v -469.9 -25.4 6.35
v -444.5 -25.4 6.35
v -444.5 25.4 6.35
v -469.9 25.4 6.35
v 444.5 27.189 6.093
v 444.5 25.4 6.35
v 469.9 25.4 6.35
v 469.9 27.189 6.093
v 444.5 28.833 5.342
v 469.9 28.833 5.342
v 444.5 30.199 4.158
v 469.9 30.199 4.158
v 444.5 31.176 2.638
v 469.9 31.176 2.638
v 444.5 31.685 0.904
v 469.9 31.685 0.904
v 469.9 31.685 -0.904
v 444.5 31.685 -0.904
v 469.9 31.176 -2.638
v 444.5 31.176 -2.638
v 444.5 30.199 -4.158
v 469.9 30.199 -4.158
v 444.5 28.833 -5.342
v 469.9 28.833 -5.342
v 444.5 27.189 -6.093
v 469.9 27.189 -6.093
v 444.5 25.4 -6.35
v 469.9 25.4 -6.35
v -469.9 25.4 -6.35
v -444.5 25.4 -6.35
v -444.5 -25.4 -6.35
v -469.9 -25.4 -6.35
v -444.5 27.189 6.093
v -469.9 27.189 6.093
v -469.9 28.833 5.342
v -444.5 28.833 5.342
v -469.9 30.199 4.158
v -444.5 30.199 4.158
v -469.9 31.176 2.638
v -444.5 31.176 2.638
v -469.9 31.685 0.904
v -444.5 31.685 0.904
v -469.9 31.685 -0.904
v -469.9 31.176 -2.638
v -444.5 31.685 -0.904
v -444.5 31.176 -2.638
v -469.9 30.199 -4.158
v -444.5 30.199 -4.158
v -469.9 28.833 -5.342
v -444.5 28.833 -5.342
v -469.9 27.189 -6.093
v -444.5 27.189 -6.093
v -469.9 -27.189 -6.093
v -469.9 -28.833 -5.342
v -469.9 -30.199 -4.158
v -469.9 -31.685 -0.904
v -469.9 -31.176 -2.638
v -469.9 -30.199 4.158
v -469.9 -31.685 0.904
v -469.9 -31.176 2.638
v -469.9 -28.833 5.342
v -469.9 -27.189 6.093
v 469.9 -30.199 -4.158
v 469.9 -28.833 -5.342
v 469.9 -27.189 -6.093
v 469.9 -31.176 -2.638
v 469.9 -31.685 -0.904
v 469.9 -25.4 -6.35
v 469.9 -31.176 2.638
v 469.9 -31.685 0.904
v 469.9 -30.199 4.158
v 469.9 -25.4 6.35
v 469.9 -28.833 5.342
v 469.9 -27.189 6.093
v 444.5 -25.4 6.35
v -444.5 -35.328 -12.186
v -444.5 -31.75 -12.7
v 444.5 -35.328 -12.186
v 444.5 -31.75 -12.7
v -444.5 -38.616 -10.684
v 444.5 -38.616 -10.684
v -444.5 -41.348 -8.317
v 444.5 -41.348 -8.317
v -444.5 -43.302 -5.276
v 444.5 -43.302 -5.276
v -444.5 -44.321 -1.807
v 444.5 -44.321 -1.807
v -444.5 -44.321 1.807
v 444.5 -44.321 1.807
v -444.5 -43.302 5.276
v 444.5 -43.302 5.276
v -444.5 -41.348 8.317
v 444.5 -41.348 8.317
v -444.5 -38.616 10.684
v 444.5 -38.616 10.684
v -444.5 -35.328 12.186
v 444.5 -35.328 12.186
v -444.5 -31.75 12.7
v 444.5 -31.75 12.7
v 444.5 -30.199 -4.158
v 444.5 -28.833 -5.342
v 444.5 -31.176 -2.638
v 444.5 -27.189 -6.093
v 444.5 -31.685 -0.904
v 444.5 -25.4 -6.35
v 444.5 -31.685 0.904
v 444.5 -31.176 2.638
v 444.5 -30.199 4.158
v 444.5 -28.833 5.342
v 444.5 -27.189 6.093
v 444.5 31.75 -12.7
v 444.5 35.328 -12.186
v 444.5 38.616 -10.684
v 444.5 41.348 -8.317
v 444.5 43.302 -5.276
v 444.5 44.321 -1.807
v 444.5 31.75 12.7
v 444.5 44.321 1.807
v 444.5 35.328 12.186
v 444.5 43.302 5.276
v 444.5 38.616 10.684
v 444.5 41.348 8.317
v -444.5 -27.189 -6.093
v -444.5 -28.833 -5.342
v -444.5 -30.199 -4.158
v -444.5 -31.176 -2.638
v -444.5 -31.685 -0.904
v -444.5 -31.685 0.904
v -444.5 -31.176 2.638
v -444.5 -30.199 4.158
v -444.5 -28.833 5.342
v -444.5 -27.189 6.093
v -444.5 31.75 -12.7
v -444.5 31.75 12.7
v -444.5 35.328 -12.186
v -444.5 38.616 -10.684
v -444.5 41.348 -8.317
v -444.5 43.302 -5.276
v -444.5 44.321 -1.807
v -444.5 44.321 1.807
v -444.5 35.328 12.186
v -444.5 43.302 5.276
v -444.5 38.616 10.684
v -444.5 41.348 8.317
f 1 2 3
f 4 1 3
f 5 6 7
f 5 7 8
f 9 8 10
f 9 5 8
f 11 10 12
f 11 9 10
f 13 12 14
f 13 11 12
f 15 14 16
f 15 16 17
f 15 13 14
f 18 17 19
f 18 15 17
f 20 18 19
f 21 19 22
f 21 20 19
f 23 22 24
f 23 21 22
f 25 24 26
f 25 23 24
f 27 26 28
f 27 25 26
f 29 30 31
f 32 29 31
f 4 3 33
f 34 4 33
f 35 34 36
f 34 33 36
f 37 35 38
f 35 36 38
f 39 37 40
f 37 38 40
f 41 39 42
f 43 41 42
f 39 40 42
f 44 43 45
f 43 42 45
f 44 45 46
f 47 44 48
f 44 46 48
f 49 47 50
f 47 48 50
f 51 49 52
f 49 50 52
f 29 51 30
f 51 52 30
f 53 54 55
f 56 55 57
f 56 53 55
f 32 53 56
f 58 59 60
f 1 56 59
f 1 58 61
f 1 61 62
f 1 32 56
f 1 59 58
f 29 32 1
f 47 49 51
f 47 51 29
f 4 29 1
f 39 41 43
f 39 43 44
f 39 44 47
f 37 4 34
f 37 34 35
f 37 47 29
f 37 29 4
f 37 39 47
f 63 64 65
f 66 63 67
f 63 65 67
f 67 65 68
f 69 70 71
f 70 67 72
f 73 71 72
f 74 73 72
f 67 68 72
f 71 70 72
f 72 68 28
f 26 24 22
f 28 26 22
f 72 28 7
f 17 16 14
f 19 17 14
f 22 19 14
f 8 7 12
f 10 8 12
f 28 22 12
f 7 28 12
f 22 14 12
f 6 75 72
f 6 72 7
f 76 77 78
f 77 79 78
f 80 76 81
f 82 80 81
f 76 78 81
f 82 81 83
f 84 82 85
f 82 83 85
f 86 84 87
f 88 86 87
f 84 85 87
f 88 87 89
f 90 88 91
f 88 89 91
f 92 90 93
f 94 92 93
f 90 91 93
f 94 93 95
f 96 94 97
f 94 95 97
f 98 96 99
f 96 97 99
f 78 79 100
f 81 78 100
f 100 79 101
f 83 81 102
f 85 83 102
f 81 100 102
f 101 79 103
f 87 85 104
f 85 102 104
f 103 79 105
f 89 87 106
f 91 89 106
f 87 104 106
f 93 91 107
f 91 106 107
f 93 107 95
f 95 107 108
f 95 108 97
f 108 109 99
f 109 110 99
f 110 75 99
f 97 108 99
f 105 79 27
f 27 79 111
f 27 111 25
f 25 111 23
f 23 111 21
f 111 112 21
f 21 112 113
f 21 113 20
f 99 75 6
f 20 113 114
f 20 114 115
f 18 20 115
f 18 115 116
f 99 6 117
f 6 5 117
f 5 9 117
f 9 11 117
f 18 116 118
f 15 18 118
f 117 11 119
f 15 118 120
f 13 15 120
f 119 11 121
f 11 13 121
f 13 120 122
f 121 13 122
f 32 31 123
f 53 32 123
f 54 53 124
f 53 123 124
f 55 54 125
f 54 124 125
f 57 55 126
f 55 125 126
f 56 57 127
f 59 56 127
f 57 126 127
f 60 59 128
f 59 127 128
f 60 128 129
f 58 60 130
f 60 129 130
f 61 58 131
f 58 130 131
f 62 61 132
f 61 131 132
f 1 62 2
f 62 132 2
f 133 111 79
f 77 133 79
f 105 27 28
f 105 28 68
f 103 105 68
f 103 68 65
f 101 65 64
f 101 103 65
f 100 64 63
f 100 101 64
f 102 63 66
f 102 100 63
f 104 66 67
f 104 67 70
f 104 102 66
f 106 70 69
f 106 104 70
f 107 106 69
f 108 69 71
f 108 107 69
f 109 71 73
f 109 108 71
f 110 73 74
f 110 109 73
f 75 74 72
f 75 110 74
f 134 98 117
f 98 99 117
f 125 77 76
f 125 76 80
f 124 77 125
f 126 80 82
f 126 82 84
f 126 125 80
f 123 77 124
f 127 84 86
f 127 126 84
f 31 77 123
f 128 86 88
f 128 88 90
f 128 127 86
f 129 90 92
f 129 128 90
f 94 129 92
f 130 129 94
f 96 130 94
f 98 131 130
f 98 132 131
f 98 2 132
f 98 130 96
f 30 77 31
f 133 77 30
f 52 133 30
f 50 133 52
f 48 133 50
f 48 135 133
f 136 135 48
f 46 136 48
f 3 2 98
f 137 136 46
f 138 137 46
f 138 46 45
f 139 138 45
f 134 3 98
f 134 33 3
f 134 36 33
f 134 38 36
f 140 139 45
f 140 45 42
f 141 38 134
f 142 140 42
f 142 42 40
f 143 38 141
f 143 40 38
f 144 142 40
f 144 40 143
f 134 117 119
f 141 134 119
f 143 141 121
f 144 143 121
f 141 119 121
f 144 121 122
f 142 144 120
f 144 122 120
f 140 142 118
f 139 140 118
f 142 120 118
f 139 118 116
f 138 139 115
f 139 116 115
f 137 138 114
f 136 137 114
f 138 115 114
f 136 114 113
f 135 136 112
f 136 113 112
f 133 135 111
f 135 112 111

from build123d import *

# Parameters (mm, degrees)
BOSS_EXTRUDE1_DEPTH = 444.5
BOSS_EXTRUDE2_DEPTH = 25.4


with BuildPart() as part:
    # Sketch1 → Boss-Extrude1 (new, symmetric)
    with BuildSketch(Plane(origin=(0, 0, 0), x_dir=(0, 0, -1), z_dir=(1, 0, 0))):
        with BuildLine():
            Line((12.7, 31.75), (12.7, -31.75))
            ThreePointArc((12.7, -31.75), (0, -44.45), (-12.7, -31.75))
            Line((-12.7, -31.75), (-12.7, 31.75))
            ThreePointArc((-12.7, 31.75), (0, 44.45), (12.7, 31.75))
        make_face()
    extrude(amount=BOSS_EXTRUDE1_DEPTH, both=True)

    # Sketch2 → Boss-Extrude2 (add)
    with BuildSketch(Plane(origin=(444.5, 0, 0), x_dir=(0, 0, -1), z_dir=(1, 0, 0))):
        with BuildLine():
            Line((-6.35, -25.4), (-6.35, 25.4))
            ThreePointArc((-6.35, 25.4), (0, 31.75), (6.35, 25.4))
            Line((6.35, 25.4), (6.35, -25.4))
            ThreePointArc((6.35, -25.4), (0, -31.75), (-6.35, -25.4))
        make_face()
    boss_extrude2 = extrude(amount=BOSS_EXTRUDE2_DEPTH)

    # Mirror1: Boss-Extrude2 across plane
    add(boss_extrude2.mirror(Plane(origin=(0, 0, 0), x_dir=(0, 0, 1), z_dir=(1, 0, 0))))


solid = part.part
